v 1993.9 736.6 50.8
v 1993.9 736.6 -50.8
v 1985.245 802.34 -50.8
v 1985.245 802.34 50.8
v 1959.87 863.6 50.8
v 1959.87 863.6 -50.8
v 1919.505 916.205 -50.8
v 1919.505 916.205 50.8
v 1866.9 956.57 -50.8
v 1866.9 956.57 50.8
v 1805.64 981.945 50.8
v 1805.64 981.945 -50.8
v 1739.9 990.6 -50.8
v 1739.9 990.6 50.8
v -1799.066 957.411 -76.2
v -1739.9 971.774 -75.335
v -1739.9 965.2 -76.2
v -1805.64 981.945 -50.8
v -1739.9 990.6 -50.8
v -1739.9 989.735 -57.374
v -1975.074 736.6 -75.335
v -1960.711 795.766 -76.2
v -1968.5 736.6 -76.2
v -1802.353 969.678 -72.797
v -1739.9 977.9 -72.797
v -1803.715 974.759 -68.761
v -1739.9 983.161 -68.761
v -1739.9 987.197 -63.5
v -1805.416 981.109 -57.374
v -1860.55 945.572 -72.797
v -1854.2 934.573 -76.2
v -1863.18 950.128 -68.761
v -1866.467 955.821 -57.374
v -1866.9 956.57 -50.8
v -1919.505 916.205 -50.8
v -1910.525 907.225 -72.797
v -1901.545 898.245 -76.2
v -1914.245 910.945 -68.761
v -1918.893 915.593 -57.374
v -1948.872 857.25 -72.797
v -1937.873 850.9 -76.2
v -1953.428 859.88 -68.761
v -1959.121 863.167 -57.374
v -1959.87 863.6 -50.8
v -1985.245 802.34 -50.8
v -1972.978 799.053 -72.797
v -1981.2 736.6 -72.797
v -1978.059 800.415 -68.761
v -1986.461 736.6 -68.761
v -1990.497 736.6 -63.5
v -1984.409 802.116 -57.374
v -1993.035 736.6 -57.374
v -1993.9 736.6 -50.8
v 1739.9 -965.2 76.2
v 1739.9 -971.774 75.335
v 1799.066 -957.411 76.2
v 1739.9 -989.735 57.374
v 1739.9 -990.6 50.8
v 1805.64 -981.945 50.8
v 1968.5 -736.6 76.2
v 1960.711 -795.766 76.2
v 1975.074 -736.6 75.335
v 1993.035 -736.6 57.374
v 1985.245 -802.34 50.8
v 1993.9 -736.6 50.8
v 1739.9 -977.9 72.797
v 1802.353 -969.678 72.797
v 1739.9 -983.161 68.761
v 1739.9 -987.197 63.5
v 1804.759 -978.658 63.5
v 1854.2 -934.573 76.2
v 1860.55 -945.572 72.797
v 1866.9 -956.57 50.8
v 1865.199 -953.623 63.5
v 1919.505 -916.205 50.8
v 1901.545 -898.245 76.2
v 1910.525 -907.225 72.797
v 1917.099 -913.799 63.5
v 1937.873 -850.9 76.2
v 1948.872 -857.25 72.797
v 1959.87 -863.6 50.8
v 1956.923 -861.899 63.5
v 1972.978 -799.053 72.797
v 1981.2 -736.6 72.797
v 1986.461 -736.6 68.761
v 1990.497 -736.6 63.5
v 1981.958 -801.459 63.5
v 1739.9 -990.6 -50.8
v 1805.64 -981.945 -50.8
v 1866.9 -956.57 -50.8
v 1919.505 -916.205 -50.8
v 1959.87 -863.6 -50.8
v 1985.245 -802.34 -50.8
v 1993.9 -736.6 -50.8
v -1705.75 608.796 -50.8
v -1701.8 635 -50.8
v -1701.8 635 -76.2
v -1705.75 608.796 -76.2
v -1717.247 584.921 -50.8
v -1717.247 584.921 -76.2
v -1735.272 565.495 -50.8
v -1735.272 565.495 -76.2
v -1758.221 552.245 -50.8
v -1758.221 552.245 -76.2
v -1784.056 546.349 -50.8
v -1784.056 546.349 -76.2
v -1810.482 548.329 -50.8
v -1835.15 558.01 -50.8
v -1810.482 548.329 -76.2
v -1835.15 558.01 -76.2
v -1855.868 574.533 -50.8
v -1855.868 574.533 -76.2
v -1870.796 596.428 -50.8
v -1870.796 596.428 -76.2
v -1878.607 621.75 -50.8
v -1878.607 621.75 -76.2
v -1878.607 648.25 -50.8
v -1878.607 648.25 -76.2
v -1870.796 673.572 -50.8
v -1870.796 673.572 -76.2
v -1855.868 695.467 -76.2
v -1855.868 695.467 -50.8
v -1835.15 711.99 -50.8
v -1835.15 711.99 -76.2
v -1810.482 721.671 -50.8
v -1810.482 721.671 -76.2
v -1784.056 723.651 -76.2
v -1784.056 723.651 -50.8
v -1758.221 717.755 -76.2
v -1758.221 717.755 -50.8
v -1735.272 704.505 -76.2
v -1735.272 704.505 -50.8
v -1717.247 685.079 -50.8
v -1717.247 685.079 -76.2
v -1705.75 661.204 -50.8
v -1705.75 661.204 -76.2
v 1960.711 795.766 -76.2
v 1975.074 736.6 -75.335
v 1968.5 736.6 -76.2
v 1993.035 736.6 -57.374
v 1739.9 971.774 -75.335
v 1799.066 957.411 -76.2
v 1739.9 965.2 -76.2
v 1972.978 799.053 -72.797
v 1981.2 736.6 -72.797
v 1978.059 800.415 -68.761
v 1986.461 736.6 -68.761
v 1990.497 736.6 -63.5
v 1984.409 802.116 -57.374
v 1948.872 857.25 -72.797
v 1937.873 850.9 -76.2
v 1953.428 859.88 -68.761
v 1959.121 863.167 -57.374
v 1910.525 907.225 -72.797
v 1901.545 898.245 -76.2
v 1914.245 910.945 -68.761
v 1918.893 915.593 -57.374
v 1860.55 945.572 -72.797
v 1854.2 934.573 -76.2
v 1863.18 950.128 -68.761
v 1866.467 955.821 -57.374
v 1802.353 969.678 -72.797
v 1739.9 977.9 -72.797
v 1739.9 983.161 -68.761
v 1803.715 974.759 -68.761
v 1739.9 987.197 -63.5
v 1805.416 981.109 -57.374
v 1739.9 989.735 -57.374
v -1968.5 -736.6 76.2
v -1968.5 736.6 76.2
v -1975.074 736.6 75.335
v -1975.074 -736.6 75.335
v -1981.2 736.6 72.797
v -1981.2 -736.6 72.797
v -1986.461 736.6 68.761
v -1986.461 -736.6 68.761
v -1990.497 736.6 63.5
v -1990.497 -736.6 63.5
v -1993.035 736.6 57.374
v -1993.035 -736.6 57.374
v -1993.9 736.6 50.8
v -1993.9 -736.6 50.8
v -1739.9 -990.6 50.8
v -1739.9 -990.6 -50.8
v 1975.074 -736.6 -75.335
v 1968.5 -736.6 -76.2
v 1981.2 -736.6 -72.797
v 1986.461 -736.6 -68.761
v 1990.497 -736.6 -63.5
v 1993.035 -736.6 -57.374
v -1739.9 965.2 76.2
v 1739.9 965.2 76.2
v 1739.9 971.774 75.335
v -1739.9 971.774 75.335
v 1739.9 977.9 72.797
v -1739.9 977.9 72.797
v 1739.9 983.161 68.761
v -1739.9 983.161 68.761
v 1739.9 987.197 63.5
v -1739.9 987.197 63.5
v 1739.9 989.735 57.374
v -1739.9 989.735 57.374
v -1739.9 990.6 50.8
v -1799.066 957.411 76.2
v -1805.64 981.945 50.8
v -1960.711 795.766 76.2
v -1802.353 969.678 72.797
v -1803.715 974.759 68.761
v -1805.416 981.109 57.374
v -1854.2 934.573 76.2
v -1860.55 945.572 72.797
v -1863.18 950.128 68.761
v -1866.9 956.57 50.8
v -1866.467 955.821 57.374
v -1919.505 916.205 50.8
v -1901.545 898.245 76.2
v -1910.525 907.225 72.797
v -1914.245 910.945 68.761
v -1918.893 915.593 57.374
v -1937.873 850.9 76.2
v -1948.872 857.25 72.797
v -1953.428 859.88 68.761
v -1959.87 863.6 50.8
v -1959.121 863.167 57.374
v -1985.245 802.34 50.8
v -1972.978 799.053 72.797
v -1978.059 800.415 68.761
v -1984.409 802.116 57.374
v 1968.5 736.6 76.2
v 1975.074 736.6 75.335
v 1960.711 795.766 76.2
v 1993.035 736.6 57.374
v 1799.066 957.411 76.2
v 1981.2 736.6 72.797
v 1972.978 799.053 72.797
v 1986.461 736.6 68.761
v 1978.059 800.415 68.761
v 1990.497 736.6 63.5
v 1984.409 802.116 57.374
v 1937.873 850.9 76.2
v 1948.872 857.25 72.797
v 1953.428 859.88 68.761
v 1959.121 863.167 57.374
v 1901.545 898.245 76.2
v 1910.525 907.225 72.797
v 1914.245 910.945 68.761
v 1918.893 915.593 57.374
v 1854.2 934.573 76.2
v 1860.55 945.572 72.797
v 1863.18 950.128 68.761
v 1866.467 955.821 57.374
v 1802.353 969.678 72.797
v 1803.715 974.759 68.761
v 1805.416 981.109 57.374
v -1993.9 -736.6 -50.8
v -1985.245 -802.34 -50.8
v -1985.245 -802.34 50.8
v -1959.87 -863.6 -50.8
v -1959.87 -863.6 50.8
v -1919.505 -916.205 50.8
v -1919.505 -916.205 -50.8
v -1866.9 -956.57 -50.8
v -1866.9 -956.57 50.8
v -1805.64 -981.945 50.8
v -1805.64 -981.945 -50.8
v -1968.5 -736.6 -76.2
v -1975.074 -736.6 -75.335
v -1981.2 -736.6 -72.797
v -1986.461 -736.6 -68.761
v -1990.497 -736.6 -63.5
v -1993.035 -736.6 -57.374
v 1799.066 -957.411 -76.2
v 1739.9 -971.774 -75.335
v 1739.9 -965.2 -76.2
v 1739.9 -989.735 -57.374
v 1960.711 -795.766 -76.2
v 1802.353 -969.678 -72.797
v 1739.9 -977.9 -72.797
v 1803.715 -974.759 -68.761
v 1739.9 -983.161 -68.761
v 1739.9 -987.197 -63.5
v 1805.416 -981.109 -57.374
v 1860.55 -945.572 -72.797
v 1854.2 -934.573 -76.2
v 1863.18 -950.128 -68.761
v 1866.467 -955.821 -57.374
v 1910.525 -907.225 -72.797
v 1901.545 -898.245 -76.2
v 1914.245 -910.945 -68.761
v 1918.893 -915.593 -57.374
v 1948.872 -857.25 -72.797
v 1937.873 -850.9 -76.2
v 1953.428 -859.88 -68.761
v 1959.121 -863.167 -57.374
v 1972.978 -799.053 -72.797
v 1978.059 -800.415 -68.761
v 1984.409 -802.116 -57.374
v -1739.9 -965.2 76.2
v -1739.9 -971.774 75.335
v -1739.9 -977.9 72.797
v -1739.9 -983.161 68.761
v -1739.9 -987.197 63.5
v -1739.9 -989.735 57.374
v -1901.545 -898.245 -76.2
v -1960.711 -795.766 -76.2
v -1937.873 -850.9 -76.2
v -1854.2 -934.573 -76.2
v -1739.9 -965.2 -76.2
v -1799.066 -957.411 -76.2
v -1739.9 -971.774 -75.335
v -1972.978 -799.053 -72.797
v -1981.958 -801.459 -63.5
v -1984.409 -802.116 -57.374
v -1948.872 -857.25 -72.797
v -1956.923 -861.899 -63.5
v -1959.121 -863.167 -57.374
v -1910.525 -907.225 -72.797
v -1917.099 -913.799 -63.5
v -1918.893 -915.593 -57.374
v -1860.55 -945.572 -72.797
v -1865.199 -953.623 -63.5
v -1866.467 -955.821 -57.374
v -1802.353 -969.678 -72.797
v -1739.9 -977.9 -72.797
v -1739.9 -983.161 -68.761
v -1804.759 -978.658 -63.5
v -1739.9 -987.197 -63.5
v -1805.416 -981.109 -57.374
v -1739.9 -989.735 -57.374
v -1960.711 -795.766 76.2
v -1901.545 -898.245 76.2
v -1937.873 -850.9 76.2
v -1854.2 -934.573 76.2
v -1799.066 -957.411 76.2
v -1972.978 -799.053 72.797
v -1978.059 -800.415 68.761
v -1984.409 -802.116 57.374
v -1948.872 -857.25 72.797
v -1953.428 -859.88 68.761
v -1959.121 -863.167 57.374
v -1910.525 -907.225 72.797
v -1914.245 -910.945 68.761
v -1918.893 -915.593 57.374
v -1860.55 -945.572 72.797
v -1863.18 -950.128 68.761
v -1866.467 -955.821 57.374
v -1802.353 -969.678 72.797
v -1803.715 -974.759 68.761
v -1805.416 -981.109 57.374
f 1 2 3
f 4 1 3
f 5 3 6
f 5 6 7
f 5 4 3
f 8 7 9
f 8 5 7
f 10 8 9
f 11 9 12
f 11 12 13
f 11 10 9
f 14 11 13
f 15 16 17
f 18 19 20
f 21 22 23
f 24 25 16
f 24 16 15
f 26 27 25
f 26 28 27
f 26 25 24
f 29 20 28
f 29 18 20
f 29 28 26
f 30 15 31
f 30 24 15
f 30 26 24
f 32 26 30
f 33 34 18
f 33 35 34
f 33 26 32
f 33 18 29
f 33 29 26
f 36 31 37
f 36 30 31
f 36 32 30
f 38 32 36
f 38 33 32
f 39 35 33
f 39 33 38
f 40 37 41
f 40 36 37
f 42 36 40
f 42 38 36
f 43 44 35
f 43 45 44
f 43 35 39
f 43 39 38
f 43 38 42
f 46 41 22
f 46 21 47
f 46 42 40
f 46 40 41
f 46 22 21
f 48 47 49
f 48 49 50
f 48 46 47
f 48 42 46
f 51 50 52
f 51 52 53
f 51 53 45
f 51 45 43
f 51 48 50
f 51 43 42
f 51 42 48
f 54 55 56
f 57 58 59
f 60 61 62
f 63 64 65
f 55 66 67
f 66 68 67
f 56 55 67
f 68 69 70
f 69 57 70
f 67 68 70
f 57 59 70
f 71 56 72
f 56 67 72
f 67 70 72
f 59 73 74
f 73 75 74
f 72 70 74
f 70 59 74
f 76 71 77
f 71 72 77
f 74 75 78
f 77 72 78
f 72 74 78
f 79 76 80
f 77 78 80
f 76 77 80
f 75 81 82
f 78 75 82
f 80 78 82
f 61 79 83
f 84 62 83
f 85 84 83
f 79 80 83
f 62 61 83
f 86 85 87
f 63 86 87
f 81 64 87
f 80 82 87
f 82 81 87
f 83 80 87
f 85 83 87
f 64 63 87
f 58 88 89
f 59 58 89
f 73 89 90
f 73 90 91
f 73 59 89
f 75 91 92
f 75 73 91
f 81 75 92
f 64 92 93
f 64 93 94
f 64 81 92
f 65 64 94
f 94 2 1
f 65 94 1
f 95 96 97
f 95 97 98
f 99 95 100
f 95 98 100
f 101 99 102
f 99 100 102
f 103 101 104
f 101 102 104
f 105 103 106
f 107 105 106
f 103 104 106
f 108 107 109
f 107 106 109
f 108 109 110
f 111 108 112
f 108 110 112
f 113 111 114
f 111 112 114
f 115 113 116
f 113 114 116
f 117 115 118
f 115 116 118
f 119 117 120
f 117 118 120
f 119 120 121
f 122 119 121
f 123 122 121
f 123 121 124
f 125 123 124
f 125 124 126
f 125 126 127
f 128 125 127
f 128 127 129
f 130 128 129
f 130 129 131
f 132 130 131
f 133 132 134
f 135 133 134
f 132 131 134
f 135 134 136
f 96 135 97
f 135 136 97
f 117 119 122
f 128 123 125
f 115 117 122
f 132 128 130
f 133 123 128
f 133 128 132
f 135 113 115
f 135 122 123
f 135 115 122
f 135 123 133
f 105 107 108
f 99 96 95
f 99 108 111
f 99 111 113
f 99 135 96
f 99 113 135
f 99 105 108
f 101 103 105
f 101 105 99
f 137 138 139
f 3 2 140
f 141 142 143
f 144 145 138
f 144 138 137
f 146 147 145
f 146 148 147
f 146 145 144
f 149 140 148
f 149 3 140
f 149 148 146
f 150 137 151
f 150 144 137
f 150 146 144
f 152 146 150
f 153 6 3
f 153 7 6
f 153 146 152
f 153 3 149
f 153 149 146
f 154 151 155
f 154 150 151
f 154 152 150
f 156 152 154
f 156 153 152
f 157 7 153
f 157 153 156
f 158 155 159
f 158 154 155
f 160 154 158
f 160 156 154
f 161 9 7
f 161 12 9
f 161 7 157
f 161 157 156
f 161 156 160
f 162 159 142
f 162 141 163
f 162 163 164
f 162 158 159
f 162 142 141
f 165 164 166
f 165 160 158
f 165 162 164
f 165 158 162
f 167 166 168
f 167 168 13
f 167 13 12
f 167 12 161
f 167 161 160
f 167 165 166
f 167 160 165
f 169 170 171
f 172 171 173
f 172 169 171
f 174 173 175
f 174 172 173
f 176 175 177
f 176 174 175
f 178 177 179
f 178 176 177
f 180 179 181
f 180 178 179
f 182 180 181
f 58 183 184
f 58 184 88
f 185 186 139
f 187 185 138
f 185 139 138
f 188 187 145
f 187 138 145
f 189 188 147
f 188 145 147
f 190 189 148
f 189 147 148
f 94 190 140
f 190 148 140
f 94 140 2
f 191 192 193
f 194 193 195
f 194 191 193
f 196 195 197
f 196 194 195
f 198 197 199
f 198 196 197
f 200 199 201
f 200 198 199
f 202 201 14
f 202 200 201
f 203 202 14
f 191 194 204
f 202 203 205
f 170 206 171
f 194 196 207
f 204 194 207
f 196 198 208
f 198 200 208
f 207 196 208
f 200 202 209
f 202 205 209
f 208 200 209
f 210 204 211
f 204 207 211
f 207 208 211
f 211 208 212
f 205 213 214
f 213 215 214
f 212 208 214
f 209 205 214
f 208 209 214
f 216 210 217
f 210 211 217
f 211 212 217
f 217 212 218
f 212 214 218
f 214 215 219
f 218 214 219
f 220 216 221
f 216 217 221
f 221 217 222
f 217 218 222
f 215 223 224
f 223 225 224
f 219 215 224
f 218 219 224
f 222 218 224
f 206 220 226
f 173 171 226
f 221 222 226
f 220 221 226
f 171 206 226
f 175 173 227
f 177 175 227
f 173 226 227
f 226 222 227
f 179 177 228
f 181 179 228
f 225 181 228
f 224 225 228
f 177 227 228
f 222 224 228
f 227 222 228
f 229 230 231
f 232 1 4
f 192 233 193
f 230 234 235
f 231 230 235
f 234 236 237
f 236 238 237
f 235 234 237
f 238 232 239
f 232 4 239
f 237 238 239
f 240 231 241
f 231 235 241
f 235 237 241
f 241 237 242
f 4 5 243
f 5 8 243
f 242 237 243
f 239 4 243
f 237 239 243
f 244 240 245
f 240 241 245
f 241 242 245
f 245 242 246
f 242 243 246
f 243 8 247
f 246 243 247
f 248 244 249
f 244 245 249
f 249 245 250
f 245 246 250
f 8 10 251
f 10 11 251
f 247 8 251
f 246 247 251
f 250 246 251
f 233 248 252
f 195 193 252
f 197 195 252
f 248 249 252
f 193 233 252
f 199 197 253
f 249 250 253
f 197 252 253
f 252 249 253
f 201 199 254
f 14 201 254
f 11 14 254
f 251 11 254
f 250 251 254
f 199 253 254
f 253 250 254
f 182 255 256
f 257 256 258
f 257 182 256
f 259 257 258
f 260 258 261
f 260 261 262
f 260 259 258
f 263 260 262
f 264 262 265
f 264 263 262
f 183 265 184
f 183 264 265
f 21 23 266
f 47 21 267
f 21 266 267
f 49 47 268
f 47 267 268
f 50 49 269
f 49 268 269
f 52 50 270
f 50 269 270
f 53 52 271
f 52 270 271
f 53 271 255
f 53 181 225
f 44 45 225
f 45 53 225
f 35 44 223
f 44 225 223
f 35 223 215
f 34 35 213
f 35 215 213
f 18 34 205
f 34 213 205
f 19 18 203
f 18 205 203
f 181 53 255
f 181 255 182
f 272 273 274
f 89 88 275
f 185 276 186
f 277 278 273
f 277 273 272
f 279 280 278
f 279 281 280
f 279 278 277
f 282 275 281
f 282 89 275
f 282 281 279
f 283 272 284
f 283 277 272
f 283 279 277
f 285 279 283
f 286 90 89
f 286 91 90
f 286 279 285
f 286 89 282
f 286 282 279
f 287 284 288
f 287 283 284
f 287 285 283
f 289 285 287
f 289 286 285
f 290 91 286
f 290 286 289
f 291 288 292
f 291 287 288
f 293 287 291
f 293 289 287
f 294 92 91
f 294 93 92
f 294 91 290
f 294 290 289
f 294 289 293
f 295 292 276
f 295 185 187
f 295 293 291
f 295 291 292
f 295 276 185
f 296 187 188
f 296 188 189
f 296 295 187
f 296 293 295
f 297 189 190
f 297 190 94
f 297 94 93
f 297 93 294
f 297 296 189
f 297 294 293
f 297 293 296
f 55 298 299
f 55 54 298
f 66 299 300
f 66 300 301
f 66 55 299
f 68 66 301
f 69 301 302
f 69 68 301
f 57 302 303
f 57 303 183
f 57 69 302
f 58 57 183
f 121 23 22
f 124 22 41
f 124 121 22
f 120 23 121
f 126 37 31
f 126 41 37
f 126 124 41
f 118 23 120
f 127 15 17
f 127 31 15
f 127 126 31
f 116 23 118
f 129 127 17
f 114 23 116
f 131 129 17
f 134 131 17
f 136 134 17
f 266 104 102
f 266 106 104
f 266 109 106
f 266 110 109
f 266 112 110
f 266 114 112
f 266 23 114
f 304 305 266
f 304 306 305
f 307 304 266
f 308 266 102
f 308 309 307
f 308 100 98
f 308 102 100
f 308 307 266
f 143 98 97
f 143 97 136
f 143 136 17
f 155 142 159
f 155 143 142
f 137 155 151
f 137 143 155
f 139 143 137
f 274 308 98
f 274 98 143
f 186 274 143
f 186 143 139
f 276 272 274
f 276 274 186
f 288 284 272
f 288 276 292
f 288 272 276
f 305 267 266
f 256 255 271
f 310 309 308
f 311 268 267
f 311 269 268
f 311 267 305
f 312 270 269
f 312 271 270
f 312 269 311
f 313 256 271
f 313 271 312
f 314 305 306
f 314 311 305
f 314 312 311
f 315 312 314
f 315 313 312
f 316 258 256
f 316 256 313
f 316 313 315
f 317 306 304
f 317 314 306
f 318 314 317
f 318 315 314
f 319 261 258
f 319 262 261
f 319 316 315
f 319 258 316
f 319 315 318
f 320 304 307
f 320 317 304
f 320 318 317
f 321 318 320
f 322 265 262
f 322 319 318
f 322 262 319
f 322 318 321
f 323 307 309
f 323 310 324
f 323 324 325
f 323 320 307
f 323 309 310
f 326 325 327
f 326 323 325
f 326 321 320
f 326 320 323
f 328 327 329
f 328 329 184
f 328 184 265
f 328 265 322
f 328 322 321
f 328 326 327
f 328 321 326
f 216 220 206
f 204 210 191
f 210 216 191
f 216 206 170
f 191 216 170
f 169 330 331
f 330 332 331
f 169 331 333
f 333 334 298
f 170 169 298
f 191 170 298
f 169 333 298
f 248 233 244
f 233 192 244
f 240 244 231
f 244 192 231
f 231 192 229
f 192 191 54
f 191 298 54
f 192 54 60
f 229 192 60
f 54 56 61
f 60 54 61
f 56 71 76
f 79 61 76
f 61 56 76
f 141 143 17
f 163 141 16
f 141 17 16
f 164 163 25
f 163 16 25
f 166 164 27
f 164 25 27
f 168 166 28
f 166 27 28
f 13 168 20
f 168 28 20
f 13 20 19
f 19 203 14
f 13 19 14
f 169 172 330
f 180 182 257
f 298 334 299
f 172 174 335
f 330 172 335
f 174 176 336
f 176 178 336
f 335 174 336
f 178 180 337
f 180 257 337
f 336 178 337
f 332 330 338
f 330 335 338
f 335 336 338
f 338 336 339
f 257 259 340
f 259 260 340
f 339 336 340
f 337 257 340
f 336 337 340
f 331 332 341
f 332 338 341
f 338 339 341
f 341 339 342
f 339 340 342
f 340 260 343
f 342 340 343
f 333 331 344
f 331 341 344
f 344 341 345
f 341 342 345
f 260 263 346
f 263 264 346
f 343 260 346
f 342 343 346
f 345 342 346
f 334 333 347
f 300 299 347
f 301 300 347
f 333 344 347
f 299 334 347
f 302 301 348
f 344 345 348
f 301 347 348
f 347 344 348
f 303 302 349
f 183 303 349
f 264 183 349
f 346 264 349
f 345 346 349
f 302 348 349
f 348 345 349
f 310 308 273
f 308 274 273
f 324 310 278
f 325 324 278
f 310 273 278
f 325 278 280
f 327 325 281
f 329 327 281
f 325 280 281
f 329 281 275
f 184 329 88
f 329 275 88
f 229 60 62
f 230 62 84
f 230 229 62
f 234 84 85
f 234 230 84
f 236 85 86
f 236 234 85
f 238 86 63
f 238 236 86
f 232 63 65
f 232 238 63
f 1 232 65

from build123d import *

# Parameters (mm, degrees)
F0_W     = 3987.8
F0_H     = 152.4
F1_DEPTH = 990.6
F2_R     = 254
F3_R     = 254
F4_R     = 25.4
F5_R     = 25.4
F6_R     = 88.9
F7_DEPTH = 25.4


with BuildPart() as f1:
    # F0 (on Front) → F1 (new body, symmetric)
    with BuildSketch(Plane.XZ):
        Rectangle(F0_W, F0_H)
    extrude(amount=F1_DEPTH, both=True)

    # F2
    f2_edges = [f1.edges().sort_by_distance(p)[0] for p in [
        (-1993.9, -990.6, 0),
        (1993.9, -990.6, 0),
        (1993.9, 990.6, 0),
    ]]
    fillet(f2_edges, radius=F2_R)

    # F3
    f3_edges = [f1.edges().sort_by_distance(p)[0] for p in [
        (-1993.9, 990.6, 0),
    ]]
    fillet(f3_edges, radius=F3_R)

    # F4
    f4_edges = [f1.edges().sort_by_distance(p)[0] for p in [
        (0, -990.6, -76.2),
        (1919.505122, -916.205122, -76.2),
        (1993.9, 0, -76.2),
        (1919.505122, 916.205122, -76.2),
        (0, 990.6, -76.2),
        (-1919.505122, 916.205122, -76.2),
        (-1993.9, 0, -76.2),
        (-1919.505122, -916.205122, -76.2),
    ]]
    fillet(f4_edges, radius=F4_R)

    # F5
    f5_edges = [f1.edges().sort_by_distance(p)[0] for p in [
        (1919.505122, -916.205122, 76.2),
        (0, -990.6, 76.2),
        (-1919.505122, -916.205122, 76.2),
        (-1993.9, 0, 76.2),
        (-1919.505122, 916.205122, 76.2),
        (0, 990.6, 76.2),
        (1919.505122, 916.205122, 76.2),
        (1993.9, 0, 76.2),
    ]]
    fillet(f5_edges, radius=F5_R)

    # F6 (on face) → F7 (cut)
    with BuildSketch(Plane(origin=(0, 0, -76.2), x_dir=(1, 0, 0), z_dir=(0, 0, -1))):
        with Locations((-1790.7, -635)):
            Circle(F6_R)
    extrude(amount=-F7_DEPTH, mode=Mode.SUBTRACT)


solid = f1.part
